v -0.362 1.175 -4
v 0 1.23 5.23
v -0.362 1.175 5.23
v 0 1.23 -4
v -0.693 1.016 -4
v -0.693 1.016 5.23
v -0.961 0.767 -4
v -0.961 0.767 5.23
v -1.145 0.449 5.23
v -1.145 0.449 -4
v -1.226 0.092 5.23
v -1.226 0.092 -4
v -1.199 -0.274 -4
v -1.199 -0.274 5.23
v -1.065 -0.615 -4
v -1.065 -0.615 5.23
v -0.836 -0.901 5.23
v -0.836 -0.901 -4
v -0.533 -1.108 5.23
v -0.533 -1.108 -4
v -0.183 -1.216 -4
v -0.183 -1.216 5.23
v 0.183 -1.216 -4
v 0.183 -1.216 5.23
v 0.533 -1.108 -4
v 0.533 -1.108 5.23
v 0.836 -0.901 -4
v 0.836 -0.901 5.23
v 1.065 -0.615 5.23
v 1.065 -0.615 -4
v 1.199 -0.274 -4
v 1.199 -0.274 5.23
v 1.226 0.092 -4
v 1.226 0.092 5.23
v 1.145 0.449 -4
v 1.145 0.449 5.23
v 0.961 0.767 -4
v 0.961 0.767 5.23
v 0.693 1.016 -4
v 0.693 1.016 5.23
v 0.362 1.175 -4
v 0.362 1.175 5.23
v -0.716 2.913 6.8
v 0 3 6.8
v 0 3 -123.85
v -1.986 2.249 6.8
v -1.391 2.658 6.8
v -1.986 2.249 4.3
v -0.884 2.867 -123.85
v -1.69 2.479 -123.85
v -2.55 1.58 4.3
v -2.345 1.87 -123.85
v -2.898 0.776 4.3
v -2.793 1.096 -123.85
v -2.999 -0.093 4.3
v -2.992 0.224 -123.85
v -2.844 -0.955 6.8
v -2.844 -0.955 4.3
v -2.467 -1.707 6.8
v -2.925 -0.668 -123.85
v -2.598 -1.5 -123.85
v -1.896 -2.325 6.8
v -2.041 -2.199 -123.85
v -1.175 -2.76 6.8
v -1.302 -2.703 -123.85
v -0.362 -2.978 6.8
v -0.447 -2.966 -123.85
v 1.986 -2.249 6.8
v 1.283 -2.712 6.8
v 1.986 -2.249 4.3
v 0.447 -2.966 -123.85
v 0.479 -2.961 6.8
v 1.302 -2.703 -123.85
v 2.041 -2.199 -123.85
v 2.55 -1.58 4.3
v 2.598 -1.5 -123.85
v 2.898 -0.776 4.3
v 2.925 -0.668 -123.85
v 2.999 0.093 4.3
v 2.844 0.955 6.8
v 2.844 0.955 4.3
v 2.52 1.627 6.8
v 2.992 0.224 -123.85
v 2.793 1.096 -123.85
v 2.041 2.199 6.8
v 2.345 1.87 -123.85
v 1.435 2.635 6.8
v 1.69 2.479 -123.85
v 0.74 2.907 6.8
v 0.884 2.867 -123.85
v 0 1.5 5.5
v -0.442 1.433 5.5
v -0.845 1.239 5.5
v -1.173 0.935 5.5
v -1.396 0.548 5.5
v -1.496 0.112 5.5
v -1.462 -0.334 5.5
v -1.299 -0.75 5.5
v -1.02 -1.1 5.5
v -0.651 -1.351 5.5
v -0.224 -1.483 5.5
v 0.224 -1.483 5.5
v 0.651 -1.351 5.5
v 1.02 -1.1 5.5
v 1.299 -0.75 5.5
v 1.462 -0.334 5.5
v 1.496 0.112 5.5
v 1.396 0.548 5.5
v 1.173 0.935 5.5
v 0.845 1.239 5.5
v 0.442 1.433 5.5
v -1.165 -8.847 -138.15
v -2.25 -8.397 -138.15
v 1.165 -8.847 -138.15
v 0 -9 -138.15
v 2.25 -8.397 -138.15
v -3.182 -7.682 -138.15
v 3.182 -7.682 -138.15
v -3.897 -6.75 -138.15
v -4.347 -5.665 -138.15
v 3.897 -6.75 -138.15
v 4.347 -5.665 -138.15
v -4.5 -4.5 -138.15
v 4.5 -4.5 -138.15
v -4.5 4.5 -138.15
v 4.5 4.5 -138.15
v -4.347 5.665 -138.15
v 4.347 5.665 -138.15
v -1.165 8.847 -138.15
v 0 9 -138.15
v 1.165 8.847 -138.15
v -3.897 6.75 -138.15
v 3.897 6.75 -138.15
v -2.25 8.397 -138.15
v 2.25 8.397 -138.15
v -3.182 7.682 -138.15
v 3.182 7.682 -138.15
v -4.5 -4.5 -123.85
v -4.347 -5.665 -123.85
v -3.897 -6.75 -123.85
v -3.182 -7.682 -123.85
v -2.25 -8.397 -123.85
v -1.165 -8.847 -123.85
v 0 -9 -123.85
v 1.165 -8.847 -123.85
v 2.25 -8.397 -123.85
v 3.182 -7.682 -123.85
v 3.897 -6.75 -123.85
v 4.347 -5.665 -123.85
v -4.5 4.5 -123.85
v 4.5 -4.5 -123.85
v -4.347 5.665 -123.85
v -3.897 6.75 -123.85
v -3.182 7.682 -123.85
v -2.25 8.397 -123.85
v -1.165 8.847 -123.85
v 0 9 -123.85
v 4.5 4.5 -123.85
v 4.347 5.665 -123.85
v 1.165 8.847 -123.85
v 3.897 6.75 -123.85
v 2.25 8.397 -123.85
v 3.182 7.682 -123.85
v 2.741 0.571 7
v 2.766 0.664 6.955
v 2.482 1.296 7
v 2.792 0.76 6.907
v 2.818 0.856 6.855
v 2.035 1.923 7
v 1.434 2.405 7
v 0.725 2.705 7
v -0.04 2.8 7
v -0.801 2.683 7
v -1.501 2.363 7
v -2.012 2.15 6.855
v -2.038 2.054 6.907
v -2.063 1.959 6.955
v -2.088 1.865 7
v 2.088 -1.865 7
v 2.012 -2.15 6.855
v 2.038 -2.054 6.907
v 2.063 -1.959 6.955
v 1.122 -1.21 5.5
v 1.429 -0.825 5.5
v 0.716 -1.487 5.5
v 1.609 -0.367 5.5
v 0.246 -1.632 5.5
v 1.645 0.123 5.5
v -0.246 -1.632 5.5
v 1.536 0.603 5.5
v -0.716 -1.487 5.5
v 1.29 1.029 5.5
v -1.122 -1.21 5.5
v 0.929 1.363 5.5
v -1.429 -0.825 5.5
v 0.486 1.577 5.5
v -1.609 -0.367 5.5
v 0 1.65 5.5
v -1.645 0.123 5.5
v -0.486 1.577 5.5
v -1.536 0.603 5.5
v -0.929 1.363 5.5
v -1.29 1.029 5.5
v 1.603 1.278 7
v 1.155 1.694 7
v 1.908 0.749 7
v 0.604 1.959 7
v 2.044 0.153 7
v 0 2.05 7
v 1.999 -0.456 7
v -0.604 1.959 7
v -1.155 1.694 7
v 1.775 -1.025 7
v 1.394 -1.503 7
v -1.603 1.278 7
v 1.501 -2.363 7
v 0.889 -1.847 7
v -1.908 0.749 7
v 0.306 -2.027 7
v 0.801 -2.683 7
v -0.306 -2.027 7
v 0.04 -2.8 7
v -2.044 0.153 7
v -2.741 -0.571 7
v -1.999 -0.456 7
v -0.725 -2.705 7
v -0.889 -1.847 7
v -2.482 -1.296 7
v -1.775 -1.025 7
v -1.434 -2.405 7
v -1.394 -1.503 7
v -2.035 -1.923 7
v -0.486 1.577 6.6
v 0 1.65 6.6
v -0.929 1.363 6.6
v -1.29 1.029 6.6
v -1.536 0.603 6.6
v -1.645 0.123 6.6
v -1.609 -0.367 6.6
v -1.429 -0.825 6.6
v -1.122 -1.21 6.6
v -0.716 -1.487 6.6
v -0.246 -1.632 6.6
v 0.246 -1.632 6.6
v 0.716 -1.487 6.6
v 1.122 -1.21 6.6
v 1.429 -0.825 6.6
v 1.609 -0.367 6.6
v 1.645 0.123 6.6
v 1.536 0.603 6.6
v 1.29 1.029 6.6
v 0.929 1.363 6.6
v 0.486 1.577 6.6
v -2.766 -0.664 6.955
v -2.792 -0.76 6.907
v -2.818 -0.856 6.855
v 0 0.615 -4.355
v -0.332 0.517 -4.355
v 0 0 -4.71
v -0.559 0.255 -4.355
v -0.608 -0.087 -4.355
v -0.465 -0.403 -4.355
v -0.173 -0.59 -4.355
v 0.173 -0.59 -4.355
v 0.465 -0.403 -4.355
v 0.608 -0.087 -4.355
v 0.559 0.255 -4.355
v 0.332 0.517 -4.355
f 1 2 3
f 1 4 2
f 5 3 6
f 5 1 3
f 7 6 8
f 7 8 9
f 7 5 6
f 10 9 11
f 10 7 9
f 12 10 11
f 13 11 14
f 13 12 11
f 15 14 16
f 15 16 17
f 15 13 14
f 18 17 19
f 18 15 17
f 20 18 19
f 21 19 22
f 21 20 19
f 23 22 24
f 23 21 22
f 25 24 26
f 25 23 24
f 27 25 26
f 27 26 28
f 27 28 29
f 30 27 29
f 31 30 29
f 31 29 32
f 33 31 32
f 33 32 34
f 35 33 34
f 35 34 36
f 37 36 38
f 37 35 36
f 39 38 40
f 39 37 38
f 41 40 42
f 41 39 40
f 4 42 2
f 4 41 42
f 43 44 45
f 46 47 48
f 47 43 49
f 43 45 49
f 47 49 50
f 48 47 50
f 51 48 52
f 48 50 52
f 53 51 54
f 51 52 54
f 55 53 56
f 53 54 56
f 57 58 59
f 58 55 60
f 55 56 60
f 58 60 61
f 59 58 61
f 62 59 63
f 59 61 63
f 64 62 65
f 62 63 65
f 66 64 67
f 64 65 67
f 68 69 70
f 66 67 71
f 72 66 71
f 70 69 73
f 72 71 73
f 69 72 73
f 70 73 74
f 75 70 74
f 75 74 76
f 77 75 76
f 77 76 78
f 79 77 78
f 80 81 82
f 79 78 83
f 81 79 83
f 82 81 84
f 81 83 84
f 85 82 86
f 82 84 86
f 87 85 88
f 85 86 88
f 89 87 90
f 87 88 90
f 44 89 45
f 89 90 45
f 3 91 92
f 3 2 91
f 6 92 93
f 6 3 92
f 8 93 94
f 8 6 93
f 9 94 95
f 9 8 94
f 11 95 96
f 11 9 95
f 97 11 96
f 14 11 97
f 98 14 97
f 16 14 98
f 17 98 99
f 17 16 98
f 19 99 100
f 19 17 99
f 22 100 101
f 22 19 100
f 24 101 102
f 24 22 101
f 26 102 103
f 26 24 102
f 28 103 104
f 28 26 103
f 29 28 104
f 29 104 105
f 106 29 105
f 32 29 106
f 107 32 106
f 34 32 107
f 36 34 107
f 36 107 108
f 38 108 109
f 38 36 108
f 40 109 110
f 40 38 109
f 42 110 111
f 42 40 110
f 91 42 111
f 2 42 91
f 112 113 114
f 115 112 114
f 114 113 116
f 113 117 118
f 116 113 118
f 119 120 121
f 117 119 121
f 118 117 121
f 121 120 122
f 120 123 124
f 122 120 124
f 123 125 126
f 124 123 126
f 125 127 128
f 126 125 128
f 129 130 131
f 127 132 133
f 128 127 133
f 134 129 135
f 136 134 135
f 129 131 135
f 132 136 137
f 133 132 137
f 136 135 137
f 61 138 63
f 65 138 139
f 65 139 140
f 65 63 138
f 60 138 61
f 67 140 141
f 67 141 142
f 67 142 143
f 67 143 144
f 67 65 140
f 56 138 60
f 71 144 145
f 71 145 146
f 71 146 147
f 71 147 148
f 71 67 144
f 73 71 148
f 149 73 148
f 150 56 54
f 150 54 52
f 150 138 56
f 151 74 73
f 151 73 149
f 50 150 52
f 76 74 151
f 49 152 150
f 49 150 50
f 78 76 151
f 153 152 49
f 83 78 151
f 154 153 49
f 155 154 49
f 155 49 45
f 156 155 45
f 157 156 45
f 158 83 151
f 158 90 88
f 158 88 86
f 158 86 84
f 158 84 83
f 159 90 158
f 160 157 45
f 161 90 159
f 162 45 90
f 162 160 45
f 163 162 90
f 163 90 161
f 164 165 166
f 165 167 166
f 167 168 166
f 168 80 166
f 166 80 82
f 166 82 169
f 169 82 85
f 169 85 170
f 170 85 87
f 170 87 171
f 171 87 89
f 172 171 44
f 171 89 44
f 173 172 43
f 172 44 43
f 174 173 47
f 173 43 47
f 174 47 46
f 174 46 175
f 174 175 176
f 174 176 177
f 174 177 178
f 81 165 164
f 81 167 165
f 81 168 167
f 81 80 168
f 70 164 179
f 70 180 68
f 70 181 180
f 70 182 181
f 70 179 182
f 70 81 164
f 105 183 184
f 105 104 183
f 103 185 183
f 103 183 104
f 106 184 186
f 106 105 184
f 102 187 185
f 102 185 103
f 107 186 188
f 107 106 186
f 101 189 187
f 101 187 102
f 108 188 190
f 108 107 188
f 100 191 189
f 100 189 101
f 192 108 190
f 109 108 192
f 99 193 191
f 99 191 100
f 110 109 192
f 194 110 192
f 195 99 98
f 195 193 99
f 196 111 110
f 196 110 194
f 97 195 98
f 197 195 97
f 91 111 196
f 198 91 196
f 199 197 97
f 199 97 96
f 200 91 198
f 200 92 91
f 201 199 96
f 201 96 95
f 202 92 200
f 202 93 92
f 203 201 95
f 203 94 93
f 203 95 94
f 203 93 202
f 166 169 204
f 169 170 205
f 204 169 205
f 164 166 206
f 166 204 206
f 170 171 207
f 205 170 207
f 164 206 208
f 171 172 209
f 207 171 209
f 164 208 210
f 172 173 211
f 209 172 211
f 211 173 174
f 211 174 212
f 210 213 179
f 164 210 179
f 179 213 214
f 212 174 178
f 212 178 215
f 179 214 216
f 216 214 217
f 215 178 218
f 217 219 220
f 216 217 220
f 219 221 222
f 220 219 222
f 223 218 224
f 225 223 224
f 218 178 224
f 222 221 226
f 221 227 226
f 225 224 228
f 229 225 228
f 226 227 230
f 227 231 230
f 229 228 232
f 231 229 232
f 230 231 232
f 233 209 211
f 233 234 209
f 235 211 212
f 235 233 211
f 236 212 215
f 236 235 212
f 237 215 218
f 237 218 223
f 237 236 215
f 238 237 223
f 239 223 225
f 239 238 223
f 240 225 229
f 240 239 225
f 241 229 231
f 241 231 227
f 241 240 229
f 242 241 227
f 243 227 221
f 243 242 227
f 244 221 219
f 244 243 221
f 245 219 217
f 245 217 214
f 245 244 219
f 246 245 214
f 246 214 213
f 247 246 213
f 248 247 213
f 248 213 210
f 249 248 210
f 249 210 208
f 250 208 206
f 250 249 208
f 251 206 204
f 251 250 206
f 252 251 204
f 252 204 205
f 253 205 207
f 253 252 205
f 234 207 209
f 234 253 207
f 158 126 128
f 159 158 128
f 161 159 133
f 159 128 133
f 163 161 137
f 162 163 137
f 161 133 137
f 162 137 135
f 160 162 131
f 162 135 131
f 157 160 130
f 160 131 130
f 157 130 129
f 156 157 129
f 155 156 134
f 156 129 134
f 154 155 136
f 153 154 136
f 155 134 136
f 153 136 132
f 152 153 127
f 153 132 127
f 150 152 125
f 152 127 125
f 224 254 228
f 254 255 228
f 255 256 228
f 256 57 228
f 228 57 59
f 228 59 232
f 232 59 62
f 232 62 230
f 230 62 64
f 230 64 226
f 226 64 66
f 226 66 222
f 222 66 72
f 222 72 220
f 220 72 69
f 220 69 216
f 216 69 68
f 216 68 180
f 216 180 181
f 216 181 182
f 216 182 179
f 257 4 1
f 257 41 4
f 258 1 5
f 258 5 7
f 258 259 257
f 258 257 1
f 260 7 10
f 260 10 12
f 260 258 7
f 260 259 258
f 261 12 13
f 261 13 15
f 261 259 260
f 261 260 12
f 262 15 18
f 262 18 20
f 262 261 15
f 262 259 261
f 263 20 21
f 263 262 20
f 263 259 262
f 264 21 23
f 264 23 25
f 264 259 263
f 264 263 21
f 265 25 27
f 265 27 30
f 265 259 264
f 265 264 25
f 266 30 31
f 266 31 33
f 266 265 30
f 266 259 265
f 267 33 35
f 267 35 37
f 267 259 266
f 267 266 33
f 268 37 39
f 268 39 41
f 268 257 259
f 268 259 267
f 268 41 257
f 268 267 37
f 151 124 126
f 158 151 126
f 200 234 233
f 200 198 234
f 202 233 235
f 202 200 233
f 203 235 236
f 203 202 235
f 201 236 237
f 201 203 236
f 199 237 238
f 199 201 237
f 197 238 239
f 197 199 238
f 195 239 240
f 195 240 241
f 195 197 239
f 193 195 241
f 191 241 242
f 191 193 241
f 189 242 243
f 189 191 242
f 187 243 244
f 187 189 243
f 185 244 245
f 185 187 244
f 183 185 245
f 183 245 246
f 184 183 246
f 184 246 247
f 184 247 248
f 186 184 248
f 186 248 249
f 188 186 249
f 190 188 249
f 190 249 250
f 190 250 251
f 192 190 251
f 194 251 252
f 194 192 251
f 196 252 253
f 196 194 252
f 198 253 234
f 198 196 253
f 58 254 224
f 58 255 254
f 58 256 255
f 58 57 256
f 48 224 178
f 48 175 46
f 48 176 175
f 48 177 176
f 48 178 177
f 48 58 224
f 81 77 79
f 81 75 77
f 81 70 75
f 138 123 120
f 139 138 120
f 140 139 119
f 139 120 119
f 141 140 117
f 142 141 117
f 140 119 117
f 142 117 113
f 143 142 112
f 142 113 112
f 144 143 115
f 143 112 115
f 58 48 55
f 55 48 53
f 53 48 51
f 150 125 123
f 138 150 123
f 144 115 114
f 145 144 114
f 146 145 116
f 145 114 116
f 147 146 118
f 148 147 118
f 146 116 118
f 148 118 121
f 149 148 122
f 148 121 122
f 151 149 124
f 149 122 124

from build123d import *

# Parameters (mm, degrees)
CUT_EXTRUDE1_DEPTH  = 3.3
BOSS_EXTRUDE1_DEPTH = 14.3


with BuildPart() as part:
    # Sketch1 → Revolve1 (revolve)
    with BuildSketch(Plane(origin=(0, 0, 0), x_dir=(0, 0, -1), z_dir=(1, 0, 0))):
        Polygon((-7, 0), (-7, 2.8), (-6.8, 3), (138.15, 3), (138.15, 0), align=None)
    revolve(axis=Axis((0, 0, -138.15), (0, 0, 1)))

    # Sketch2 → Cut-Revolve1 (revolve, cut)
    with BuildSketch(Plane(origin=(0, 0, 0), x_dir=(0, 0, -1), z_dir=(1, 0, 0))):
        Polygon((-7, 0), (-7, 2.05), (-6.6, 1.65), (-5.5, 1.65), (-5.5, 1.5), (-5.2295, 1.2295), (4, 1.2295), (4.709852156, 0), align=None)
    revolve(axis=Axis((0, 0, -4.709852156), (0, 0, 1)), mode=Mode.SUBTRACT)

    # Sketch3 → Cut-Extrude1 (cut)
    with BuildSketch(Plane.XY.offset(4.3)):
        Polygon((-6.447248163, -4.742941189), (3.2120101, -7.33113164), (5.800200551, 2.328126623), (3.385385985, 2.975174236), (1.12071934, -5.476676744), (-3.708909791, -4.182581519), (-1.444243147, 4.269269461), (-3.859057712, 4.916317074), align=None)
    extrude(amount=CUT_EXTRUDE1_DEPTH, mode=Mode.SUBTRACT)

    # Sketch4 → Boss-Extrude1 (add)
    with BuildSketch(Plane.XY.offset(-138.15)):
        with BuildLine():
            Line((4.5, -4.5), (4.5, 4.5))
            ThreePointArc((4.5, 4.5), (3.181980515, 7.681980515), (0, 9))
            ThreePointArc((0, 9), (-3.181980515, 7.681980515), (-4.5, 4.5))
            Line((-4.5, 4.5), (-4.5, -4.5))
            ThreePointArc((-4.5, -4.5), (-3.181980515, -7.681980515), (0, -9))
            ThreePointArc((0, -9), (3.181980515, -7.681980515), (4.5, -4.5))
        make_face()
    extrude(amount=BOSS_EXTRUDE1_DEPTH)


solid = part.part
